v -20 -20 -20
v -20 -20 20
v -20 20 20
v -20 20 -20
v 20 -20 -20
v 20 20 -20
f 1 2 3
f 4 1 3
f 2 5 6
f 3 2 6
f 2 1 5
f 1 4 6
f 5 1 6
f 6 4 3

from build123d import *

# Parameters (mm, degrees)
F0_W          = 40
F0_H          = 40
F1_DEPTH      = 20
F1_DEPTH_BACK = 20
F2_SIZE       = 39.99999


# Not quite as in the source:
# - a fillet or chamfer is up to 0.001 mm smaller than in the source, because OpenCascade refuses the exact size


with BuildPart() as f1:
    # F0 (on Top) → F1 (new body, two sides)
    with BuildSketch(Plane.XY) as f1_sk:
        Rectangle(F0_W, F0_H)
    extrude(amount=F1_DEPTH)
    extrude(f1_sk.sketch, amount=-F1_DEPTH_BACK)

    # F2 (size 40 in the source; OpenCascade refuses exactly that, so slightly less here)
    f2_edges = [f1.edges().sort_by_distance(p)[0] for p in [
        (20, 0, 20),
    ]]
    chamfer(f2_edges, length=F2_SIZE)


solid = f1.part
